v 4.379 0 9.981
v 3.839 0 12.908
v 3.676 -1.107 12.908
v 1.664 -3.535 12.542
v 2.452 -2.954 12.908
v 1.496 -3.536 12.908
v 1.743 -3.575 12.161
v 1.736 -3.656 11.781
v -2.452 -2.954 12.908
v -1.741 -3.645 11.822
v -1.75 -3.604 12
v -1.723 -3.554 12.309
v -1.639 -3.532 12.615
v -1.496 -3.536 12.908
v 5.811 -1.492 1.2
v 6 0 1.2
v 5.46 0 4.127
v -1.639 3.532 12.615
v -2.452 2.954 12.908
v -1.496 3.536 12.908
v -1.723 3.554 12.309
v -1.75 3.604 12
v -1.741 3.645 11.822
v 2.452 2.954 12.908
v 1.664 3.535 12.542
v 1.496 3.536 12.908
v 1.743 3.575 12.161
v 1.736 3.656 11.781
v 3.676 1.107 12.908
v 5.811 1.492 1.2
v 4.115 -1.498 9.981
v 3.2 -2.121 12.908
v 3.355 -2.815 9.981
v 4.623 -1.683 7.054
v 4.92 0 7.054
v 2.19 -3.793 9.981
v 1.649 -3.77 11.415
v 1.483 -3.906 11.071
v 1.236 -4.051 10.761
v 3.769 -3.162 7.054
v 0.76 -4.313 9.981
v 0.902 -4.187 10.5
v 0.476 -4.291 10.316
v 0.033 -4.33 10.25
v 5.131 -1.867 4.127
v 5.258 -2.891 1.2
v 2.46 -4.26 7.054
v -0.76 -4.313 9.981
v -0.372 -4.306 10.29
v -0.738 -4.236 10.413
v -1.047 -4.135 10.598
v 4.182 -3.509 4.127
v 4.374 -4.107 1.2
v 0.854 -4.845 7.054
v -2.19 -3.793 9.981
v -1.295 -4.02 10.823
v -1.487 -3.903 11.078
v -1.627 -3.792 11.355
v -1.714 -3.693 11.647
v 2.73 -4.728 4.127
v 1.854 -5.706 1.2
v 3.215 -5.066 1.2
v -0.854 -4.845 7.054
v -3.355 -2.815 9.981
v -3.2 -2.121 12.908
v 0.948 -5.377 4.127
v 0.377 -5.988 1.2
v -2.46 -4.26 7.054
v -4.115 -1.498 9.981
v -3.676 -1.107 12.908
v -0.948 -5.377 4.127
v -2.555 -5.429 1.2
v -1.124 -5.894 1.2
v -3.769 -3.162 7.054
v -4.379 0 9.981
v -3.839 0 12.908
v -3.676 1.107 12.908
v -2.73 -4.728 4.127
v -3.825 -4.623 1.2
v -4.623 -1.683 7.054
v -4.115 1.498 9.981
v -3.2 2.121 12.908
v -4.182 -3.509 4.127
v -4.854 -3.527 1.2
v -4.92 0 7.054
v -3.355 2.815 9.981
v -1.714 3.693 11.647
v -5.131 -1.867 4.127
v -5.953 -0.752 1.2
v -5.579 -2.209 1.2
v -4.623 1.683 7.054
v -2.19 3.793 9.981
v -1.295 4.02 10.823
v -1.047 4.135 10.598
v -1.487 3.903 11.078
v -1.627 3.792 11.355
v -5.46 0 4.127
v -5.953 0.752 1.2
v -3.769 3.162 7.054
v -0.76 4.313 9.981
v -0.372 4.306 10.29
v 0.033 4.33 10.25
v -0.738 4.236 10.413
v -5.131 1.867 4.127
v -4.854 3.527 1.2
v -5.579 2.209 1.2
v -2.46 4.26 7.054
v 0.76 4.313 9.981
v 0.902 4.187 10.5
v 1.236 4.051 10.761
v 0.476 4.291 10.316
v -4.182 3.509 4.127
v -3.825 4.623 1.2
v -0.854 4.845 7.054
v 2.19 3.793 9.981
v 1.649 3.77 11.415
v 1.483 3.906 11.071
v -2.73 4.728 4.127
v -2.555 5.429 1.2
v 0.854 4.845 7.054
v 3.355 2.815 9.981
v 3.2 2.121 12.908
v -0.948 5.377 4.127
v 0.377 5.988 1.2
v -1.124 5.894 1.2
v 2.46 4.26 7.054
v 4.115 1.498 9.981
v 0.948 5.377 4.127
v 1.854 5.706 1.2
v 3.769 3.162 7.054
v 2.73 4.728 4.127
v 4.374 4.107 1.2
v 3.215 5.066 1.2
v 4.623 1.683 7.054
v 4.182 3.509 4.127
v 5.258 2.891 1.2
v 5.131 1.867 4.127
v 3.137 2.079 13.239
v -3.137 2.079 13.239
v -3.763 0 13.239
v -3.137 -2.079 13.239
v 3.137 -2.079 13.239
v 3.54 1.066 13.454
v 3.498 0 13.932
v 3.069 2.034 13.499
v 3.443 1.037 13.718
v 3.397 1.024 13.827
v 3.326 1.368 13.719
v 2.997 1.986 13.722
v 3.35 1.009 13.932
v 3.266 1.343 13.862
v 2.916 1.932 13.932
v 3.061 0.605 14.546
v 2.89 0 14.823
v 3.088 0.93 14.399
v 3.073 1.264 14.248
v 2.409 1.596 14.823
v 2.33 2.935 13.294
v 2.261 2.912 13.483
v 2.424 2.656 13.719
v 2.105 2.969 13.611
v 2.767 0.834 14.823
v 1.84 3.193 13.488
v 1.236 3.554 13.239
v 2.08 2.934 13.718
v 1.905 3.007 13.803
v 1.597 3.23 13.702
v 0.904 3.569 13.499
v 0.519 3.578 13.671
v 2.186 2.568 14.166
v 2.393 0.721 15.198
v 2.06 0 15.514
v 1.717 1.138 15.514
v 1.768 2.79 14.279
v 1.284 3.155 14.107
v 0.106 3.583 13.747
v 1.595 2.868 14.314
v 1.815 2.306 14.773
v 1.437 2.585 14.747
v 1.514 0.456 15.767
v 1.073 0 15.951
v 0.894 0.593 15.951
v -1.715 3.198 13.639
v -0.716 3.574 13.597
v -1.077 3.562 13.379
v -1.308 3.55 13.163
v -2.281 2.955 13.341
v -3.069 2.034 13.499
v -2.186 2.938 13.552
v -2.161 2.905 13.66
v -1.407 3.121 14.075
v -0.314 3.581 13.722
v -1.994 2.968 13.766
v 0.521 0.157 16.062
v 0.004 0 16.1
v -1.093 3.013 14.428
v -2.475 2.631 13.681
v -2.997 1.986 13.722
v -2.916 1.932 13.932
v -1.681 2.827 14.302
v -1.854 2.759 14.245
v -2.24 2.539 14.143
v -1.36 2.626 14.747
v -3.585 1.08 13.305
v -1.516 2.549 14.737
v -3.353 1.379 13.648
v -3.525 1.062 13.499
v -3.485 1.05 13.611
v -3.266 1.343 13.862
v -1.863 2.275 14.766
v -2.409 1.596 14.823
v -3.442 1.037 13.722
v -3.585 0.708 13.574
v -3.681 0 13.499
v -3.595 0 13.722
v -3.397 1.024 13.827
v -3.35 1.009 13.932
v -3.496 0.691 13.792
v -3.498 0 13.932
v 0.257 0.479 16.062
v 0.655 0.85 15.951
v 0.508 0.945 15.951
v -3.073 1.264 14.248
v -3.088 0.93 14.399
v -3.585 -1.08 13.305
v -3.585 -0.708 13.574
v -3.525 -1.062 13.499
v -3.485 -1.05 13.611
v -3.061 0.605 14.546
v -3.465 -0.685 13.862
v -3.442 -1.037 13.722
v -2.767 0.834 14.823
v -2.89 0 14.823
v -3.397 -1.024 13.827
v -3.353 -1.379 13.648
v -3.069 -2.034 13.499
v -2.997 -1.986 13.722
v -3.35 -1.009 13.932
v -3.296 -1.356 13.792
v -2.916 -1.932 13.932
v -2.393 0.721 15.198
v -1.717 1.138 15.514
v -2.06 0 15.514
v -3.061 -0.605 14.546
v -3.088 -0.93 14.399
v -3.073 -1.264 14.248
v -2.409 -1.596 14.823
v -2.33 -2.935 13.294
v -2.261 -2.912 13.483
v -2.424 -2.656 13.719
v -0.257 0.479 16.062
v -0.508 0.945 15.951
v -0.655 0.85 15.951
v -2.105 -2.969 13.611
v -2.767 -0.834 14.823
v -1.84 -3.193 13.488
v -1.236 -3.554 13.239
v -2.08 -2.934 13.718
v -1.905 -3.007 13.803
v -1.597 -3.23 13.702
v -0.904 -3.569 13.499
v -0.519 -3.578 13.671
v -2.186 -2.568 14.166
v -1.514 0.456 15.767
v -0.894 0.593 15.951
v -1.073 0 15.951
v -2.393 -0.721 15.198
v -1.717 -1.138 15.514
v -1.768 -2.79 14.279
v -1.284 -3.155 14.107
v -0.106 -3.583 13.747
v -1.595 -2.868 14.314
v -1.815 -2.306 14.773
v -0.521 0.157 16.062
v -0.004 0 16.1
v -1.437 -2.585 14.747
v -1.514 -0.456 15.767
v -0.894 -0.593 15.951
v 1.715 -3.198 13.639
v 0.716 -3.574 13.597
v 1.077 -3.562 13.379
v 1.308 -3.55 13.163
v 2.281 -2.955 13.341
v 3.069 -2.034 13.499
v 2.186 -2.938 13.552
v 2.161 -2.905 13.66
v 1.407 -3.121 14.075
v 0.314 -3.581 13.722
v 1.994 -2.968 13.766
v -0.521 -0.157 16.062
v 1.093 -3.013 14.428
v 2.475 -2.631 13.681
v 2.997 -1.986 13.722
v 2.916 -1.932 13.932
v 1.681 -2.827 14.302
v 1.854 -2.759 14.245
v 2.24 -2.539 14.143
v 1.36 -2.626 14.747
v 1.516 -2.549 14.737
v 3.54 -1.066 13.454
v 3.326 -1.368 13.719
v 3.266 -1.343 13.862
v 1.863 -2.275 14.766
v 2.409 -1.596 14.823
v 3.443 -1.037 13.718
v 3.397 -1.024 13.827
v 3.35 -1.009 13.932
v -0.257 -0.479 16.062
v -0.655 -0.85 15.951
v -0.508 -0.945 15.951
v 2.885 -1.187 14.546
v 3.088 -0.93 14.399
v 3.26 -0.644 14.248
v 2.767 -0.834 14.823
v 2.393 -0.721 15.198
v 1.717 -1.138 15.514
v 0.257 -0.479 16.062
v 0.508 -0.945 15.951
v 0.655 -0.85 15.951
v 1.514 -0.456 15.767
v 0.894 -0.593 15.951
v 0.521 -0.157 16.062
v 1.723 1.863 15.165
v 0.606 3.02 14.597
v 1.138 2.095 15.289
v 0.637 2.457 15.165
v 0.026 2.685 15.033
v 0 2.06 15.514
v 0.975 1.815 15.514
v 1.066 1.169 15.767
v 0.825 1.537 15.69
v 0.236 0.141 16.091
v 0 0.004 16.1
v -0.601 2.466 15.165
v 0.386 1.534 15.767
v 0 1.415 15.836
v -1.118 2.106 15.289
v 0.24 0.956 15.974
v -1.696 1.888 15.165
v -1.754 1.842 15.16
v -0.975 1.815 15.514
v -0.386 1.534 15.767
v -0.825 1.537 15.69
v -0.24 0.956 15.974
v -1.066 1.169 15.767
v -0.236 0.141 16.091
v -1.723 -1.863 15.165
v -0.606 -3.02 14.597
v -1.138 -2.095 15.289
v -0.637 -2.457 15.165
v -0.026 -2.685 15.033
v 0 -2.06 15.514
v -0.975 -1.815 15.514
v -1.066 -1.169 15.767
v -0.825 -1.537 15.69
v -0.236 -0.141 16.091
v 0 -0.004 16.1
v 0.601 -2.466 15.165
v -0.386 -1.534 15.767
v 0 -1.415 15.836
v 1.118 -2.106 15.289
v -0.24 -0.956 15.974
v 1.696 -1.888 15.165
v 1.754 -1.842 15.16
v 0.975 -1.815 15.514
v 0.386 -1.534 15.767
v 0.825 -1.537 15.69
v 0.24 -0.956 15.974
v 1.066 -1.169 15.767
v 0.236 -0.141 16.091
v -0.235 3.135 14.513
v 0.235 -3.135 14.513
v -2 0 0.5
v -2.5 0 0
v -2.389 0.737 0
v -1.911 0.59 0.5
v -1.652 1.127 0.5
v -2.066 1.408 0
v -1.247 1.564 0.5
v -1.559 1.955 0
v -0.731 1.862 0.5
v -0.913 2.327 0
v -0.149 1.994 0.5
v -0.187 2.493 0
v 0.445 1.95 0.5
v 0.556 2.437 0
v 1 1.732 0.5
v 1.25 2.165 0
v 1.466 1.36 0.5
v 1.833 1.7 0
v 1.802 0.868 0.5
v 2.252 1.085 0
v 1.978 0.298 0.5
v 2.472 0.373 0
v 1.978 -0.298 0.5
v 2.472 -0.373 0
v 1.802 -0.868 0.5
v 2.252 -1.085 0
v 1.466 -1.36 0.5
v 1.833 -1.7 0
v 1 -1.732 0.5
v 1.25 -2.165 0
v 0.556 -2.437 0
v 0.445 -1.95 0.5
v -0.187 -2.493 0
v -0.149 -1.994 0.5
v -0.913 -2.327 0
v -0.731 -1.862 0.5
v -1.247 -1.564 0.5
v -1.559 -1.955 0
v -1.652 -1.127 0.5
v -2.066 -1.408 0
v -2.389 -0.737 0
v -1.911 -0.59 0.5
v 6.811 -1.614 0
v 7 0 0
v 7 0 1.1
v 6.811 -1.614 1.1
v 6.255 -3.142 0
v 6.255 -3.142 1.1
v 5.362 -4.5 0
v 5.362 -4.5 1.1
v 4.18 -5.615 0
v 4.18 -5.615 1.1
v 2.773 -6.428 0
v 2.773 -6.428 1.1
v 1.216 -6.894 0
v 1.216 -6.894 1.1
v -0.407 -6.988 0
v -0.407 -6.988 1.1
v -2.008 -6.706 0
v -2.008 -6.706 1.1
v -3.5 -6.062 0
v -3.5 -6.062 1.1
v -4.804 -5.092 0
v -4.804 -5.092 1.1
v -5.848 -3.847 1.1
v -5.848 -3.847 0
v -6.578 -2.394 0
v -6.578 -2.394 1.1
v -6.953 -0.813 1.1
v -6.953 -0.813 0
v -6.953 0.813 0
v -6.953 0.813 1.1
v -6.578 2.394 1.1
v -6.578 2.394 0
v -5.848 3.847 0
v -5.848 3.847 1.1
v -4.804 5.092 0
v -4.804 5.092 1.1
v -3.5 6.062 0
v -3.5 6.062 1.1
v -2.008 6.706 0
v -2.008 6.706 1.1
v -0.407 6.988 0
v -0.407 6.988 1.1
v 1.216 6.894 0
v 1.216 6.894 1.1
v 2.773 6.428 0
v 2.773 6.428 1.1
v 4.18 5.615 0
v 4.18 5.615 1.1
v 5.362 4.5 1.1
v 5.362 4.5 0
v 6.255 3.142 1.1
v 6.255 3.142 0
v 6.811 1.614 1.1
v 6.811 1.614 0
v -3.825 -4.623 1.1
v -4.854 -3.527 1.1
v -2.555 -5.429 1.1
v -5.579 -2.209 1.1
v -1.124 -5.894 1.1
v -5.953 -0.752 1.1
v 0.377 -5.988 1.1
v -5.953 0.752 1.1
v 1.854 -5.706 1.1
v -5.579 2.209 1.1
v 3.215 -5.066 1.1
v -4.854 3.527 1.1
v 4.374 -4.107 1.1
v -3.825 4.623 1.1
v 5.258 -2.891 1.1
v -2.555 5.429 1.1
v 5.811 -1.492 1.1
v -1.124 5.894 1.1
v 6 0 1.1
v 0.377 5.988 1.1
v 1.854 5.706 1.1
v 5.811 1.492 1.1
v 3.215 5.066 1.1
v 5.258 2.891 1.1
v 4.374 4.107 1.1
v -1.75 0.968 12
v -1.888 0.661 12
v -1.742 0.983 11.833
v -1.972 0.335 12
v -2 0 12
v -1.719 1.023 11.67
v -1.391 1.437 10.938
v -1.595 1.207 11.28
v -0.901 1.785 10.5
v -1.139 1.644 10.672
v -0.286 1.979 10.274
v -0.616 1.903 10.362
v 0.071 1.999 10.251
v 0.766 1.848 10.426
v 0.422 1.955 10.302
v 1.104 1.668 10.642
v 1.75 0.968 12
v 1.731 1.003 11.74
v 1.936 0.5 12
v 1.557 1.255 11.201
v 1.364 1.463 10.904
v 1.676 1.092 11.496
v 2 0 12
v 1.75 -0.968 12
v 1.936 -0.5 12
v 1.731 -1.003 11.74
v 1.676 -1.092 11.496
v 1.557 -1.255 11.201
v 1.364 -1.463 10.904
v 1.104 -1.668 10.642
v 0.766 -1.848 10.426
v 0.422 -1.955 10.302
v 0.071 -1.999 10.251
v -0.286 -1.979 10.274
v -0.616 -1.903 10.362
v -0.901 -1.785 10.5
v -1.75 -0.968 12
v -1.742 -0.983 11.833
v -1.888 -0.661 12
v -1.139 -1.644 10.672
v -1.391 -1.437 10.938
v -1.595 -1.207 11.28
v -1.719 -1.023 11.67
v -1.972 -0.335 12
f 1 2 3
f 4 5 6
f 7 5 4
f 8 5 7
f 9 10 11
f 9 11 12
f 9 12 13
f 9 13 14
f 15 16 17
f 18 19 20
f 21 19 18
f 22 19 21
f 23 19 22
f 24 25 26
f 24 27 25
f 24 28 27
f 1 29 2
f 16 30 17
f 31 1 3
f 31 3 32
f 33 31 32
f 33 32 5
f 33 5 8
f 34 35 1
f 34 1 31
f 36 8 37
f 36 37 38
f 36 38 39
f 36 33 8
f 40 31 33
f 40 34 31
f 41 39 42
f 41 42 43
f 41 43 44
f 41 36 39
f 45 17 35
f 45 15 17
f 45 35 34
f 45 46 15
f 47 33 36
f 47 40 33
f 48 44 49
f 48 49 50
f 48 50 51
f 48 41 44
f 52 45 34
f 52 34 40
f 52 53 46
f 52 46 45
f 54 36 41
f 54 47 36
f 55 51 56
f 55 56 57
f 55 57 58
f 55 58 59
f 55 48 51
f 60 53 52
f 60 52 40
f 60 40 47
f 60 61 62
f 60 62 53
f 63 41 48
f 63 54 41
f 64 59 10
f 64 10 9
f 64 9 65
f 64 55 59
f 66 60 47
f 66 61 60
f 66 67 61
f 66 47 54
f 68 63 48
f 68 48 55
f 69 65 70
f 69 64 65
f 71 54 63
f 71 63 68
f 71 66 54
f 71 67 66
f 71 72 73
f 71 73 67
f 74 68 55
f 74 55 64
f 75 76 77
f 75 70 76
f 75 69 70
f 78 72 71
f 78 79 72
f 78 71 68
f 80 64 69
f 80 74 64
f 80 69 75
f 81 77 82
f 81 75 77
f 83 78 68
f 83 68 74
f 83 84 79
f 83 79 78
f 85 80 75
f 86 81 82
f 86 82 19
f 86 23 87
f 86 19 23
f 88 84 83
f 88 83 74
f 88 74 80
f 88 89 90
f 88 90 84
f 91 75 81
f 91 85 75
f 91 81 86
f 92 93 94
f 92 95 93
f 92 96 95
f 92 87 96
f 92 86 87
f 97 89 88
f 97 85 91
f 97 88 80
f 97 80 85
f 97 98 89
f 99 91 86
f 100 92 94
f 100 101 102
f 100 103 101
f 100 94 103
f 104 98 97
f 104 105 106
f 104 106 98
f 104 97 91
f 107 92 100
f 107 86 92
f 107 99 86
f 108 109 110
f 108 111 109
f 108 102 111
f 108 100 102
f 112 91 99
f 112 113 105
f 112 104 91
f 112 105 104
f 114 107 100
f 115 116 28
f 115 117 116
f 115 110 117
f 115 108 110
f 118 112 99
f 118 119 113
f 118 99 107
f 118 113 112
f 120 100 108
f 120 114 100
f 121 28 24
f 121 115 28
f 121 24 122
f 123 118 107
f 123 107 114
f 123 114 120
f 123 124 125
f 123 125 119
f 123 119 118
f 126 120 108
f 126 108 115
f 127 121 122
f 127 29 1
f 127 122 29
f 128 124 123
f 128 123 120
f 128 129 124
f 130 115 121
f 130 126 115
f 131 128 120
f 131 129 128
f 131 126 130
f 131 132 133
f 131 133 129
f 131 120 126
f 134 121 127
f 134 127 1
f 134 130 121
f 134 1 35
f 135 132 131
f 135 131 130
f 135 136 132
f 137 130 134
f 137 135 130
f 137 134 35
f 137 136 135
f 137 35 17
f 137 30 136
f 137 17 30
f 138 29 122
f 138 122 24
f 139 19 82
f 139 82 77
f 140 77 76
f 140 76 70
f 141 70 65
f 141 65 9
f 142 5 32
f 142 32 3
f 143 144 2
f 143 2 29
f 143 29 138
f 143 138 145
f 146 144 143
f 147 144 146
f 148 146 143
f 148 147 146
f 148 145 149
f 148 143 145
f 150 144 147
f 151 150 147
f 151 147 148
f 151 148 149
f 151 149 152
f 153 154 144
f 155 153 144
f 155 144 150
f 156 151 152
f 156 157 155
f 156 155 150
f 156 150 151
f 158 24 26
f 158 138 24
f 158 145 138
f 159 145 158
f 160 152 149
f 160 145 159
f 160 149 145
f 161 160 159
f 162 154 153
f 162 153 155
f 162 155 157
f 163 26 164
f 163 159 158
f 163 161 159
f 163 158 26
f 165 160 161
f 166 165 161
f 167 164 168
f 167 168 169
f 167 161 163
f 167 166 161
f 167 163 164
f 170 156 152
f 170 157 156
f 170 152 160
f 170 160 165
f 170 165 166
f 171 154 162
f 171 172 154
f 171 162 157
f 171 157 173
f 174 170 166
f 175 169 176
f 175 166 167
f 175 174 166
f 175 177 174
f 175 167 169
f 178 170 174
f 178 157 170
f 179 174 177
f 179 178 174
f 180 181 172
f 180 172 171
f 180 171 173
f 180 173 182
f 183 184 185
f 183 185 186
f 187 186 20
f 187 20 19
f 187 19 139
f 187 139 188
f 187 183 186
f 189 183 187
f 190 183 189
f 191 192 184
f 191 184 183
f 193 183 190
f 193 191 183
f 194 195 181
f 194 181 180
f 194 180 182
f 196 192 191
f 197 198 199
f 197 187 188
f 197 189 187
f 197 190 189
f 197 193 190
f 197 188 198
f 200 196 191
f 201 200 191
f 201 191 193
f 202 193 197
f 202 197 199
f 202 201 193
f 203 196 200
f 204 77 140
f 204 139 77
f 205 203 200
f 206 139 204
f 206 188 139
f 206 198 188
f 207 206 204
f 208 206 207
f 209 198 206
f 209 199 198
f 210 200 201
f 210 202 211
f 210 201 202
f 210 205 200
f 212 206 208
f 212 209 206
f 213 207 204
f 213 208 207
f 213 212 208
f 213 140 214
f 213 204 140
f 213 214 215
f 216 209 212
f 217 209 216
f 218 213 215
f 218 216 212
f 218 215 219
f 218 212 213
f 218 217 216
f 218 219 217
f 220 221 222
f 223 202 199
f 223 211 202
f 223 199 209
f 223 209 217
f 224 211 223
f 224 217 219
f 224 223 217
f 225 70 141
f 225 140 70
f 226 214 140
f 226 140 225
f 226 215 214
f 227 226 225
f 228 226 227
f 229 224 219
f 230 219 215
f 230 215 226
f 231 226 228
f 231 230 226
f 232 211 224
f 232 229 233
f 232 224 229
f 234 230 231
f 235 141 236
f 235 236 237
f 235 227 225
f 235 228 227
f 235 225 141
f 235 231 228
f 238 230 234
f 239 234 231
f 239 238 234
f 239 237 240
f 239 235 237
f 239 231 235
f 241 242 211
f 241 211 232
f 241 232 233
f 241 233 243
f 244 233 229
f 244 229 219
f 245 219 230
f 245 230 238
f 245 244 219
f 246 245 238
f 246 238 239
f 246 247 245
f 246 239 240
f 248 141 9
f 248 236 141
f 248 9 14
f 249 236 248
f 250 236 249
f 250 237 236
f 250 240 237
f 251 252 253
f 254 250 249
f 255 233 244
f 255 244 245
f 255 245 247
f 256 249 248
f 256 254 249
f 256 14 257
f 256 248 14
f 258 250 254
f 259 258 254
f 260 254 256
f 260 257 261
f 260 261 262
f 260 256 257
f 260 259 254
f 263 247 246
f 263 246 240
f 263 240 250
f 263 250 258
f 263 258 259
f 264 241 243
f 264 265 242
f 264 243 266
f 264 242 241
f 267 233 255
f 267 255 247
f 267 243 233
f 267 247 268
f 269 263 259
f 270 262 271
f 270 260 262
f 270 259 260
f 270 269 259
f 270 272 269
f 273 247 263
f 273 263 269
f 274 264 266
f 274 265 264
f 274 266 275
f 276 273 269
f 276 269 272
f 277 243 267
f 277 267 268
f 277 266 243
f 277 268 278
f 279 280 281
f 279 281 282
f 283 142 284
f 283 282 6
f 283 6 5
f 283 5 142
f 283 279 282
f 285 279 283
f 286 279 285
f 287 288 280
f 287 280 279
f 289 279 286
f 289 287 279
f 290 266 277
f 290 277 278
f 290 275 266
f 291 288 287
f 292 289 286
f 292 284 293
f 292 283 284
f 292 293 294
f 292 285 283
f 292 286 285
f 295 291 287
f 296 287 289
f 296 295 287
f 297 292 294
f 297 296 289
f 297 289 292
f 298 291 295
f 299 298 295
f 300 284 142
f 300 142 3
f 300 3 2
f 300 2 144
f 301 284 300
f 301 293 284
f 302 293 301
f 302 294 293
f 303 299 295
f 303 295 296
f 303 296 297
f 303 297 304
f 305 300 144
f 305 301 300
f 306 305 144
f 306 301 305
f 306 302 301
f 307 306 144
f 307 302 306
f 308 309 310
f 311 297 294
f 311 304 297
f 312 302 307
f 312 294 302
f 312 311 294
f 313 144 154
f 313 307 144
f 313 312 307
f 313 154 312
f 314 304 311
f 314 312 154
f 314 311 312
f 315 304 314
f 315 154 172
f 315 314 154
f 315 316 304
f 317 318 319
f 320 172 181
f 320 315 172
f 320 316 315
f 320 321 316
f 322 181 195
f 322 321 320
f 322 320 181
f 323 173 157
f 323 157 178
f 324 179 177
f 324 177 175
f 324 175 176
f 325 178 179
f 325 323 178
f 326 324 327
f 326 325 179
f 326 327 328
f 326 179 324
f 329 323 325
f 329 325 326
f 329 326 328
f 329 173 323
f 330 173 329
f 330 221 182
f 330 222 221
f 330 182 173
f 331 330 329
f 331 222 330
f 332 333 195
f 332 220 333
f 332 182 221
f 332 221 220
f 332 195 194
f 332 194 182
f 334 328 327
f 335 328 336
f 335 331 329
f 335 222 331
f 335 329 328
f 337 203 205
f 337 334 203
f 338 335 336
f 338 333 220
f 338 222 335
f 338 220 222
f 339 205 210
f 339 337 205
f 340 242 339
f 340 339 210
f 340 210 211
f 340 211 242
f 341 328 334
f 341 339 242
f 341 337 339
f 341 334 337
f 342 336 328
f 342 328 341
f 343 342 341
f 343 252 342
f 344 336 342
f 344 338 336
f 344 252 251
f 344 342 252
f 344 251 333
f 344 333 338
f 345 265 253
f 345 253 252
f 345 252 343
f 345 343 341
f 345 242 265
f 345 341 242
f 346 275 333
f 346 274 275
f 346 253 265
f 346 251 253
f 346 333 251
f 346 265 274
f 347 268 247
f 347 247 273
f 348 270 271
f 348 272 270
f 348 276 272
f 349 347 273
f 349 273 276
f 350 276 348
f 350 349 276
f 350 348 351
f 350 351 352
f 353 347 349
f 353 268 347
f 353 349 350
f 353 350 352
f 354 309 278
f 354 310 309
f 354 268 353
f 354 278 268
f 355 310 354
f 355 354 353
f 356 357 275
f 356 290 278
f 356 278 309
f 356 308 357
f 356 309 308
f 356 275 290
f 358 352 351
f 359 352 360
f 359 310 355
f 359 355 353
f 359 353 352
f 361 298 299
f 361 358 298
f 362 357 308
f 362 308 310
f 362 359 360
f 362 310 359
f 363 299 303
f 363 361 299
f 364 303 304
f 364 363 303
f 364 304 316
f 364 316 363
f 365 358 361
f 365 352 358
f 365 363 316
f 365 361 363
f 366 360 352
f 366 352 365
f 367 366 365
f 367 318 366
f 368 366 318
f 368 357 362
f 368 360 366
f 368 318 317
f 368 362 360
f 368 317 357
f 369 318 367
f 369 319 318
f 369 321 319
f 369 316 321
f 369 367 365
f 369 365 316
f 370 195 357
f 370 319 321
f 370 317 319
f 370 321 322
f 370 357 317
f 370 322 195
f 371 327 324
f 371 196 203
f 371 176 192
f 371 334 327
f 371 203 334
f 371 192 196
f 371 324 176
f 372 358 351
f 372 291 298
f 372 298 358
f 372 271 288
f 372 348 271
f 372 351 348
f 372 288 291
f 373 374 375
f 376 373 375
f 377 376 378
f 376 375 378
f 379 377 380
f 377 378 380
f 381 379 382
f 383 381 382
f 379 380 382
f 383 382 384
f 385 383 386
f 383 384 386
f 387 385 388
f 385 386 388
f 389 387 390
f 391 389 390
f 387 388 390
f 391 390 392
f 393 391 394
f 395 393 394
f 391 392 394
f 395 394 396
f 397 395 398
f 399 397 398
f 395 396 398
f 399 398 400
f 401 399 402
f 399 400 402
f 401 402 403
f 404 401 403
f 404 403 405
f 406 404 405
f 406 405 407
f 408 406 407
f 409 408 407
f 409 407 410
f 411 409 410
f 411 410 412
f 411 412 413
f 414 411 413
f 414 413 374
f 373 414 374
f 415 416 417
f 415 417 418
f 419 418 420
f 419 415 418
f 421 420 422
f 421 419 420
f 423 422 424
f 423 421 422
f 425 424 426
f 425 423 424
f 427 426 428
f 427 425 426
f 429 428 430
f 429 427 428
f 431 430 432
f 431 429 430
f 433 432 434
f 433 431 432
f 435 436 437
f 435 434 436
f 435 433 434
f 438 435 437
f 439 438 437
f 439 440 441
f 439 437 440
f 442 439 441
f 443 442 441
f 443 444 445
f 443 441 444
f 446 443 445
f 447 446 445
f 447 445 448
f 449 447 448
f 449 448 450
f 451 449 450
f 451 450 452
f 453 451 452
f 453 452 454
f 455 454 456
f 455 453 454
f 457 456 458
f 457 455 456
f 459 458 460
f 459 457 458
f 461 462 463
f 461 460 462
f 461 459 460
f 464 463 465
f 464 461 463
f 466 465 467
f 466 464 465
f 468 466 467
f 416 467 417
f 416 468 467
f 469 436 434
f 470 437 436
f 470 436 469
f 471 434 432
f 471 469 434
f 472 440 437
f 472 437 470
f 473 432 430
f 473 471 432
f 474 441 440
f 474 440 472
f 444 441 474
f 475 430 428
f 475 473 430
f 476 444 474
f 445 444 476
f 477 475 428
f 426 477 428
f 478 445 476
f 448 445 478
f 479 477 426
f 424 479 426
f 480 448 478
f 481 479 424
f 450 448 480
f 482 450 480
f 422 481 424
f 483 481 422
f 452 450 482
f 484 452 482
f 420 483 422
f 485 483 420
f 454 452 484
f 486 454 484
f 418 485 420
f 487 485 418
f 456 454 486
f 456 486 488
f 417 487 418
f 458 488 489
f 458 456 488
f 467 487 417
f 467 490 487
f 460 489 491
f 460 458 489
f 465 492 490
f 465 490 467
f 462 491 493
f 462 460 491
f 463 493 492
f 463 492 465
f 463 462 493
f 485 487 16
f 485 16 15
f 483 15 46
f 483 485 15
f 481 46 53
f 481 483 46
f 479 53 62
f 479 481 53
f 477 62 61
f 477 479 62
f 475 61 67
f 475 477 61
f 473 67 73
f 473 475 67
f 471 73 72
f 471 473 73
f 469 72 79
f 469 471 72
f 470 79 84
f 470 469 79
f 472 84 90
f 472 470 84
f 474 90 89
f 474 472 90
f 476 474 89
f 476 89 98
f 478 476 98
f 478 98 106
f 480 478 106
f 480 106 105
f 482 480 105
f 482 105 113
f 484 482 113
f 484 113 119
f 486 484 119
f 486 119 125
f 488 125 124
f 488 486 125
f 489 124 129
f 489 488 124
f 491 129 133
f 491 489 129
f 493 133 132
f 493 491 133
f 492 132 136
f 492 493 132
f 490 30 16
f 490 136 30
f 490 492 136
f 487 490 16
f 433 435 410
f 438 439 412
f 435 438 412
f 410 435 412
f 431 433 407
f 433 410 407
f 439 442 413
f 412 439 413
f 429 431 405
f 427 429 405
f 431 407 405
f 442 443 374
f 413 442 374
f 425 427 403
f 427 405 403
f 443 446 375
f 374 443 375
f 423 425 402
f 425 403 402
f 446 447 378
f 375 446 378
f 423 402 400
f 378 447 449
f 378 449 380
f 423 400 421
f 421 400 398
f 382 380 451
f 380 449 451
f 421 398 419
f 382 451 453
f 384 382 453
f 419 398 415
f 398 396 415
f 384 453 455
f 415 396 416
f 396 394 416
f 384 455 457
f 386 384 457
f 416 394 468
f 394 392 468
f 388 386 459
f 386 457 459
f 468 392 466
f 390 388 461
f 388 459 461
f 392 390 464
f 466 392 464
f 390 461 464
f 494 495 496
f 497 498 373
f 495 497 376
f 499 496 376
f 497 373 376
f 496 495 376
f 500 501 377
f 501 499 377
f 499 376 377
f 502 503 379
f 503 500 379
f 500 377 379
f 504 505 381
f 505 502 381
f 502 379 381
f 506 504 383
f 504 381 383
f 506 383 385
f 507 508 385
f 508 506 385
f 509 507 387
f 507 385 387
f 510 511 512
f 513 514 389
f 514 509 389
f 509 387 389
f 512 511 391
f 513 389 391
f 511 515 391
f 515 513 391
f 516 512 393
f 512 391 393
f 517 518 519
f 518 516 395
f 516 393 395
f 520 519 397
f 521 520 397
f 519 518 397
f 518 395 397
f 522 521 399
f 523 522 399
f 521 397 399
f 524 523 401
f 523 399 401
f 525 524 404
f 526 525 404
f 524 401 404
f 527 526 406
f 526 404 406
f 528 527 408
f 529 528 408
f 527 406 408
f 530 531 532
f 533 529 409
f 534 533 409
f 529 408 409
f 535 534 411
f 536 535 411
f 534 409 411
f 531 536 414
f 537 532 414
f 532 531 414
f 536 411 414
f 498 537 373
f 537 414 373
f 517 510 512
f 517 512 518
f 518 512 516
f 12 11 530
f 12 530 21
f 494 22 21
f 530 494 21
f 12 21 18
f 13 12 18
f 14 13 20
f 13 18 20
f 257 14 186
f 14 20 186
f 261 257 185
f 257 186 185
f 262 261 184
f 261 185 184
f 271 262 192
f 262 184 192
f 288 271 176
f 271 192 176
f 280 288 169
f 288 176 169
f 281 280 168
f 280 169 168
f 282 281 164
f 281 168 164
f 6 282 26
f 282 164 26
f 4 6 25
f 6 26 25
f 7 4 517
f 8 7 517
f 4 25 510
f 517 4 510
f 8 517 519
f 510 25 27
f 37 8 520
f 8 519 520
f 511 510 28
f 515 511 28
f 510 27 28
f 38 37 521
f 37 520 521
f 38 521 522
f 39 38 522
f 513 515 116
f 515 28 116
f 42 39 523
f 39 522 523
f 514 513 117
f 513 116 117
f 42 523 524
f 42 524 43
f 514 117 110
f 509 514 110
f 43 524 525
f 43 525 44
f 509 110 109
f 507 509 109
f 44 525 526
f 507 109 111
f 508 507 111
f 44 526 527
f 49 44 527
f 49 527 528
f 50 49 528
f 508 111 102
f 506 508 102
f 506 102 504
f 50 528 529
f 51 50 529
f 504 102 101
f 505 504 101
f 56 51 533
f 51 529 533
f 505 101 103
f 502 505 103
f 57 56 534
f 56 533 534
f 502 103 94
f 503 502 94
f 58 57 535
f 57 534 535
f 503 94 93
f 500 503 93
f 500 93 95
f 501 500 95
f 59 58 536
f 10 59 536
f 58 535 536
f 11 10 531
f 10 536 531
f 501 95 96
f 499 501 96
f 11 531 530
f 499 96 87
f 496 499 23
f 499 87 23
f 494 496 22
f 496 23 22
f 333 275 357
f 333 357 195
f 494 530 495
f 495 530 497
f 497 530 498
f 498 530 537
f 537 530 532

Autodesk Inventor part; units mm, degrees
ref_plane "YZ Plane" through (0, 0, 0) normal (1, 0, 0) x (0, 1, 0)
ref_plane "XZ Plane" through (0, 0, 0) normal (0, 1, 0) x (-1, 0, 0)
sketch "Sketch1" plane through (0, 0, 0) normal (0, 0, 1) x (1, 0, 0)
  circle A0 centre (0, 0) radius 7
  dimension "d0" = 14
extrude "Extrusion1" add sketch "Sketch1" along normal blind 1.1
sketch "Sketch2" plane through (0, 0, 1.1) normal (0, 0, 1) x (1, 0, 0)
  circle A0 centre (0, 0) radius 7 projected
  circle A1 centre (0, 0) radius 6
  dimension "d3" = 12
ref_plane "Work Plane1" through (0, 0, 16.1) normal (0, 0, 1) x (1, 0, 0)
sketch "Sketch3" plane through (0, 0, 16.1) normal (0, 0, 1) x (1, 0, 0)
  circle A0 centre (0, 0) radius 3.25
  dimension "d5" = 6.5
extrude "Extrusion2" add sketch "Sketch2" along normal blind 0.1 contours A1
loft "Loft1" add profiles "Sketch3" section 1 edges at (-6, 0, 1.2)
fillet "Fillet1" radius 3.9 1 edges at (-3.25, 0, 16.1)
sketch "Sketch4" plane through (0, 0, 0) normal (0, 1, 0) x (-1, 0, 0)
  circle A0 centre (0, 12) radius 1.75
  point P0 (0, 0)
  dimension "d13" = 12
  dimension "d14" = 3.5
extrude "Extrusion3" cut sketch "Sketch4" along normal through all both and the other way through all
sketch "Sketch5" plane through (0, 0, 0) normal (0, 0, -1) x (-1, 0, 0)
  circle A0 centre (0, 0) radius 7 projected
  circle A1 centre (0, 0) radius 2
  dimension "d17" = 4
extrude "Extrusion4" cut sketch "Sketch5" against normal blind 12 contours A1
chamfer "Chamfer1" distance 0.5 angle 45 1 edges at (2, 0, 0)
properties part number "nut"
